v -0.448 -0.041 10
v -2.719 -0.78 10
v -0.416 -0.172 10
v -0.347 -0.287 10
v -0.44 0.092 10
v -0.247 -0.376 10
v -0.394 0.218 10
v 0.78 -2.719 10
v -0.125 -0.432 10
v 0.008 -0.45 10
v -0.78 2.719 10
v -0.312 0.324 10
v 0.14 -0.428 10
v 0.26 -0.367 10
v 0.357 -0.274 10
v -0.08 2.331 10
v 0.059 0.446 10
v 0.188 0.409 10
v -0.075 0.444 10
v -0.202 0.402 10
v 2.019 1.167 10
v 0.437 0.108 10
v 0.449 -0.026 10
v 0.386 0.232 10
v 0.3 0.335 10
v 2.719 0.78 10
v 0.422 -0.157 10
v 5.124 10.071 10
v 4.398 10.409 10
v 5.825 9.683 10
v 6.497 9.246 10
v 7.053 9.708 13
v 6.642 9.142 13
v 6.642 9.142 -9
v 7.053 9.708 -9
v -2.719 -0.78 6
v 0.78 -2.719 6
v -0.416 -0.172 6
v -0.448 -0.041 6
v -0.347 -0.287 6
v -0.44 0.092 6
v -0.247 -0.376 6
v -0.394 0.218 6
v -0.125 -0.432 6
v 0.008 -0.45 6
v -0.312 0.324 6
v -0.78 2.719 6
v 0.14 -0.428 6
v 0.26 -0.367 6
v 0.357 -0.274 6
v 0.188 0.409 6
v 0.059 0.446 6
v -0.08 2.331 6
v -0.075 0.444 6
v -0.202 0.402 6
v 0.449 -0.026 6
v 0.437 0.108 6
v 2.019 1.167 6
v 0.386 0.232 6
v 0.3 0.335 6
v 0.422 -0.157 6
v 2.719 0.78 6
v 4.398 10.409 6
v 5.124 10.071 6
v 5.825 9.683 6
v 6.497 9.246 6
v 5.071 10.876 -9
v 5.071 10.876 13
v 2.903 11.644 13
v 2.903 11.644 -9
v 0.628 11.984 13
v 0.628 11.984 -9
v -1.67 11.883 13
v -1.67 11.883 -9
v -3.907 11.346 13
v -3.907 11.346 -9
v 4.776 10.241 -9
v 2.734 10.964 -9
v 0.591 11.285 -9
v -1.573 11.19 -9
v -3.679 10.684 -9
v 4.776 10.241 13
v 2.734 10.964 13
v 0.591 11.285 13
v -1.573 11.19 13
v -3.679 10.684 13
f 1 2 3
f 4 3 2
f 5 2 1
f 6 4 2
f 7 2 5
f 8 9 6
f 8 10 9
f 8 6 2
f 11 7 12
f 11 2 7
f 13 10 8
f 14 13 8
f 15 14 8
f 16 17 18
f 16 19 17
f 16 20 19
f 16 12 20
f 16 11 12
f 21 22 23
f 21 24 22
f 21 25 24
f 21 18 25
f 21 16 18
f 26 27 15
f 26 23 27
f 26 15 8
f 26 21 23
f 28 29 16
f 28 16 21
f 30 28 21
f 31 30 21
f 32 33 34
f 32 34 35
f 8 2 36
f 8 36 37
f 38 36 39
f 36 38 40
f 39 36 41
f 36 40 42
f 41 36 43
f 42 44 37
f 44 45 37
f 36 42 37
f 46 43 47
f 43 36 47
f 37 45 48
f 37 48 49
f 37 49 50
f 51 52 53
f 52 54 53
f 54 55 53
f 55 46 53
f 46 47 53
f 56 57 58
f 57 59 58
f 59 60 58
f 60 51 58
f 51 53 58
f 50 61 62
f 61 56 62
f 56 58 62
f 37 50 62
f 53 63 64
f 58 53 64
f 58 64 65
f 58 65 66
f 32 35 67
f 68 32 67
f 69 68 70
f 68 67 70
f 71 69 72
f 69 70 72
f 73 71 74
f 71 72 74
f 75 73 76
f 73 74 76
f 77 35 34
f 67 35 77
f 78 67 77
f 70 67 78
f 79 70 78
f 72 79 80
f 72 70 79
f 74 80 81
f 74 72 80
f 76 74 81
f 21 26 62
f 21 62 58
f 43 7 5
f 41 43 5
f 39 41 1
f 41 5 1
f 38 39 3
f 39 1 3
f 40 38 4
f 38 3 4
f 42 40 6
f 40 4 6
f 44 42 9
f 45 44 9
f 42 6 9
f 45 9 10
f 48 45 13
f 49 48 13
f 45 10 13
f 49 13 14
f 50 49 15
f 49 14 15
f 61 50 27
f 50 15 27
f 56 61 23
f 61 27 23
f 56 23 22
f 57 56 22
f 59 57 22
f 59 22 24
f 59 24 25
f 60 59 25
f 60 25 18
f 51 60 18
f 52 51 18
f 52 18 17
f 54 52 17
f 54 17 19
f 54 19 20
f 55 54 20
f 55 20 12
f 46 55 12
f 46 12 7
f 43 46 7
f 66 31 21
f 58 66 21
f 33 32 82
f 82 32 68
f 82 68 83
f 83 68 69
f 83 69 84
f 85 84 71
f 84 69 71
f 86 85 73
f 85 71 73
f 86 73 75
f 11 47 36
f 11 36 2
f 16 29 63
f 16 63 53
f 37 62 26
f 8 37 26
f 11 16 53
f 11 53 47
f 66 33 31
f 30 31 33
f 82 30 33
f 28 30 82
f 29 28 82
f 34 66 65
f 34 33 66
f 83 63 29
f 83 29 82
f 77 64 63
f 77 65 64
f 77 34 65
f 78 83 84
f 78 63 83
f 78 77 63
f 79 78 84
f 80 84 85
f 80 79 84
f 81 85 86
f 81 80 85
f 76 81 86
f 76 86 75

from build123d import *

# Parameters (mm, degrees)
PAD168_DEPTH              = 22
SKETCH247_W               = 4
SKETCH247_H               = 4
PAD167_DEPTH              = 13.5
SKETCH244_R               = 0.45
SKETCH244_W               = 0.8
SKETCH244_H               = 9.5
POCKET031_DEPTH           = 5
BODY041_PLACEMENT_ANGLE   = 90
FUSION004_PLACEMENT_ANGLE = 29


with BuildPart() as segment_wing004:
    # Sketch240 → Pad168 (new body)
    with BuildSketch(Plane.XY):
        with BuildLine():
            ThreePointArc((1.377124, 11.215772), (-3.957343, 10.584396), (-8.397537, 7.561176))
            Line((-8.397537, 7.561176), (-8.917738, 8.029567))
            ThreePointArc((1.462432, 11.910554), (-4.202489, 11.240066), (-8.917738, 8.029567))
            Line((1.377124, 11.215772), (1.462432, 11.910554))
        make_face()
    extrude(amount=PAD168_DEPTH)


with BuildPart() as segment_wing004_1:
    # Body044 placement: moved
    add(segment_wing004.part.moved(Location((0, 0, -9))))


with BuildPart() as segment_on004:
    # Sketch247 → Pad167 (new body)
    with BuildSketch(Plane.XY):
        with Locations((0, 6)):
            Rectangle(SKETCH247_W, SKETCH247_H)
    extrude(amount=PAD167_DEPTH)

    # Sketch244 (on Face1 of Pad167) → Pocket031 (cut)
    with BuildSketch(Plane(origin=(0, 8, 0), x_dir=(-1, 0, 0), z_dir=(0, 1, 0))):
        with Locations((0, 11.5)):
            Circle(SKETCH244_R)
        with Locations((-1.6, 4.75)):
            Rectangle(SKETCH244_W, SKETCH244_H)
        with Locations((1.6, 4.75)):
            Rectangle(SKETCH244_W, SKETCH244_H)
    extrude(amount=-POCKET031_DEPTH, mode=Mode.SUBTRACT)


with BuildPart() as segment_on004_1:
    # Body041 placement: moved
    add(segment_on004.part.moved(Location((0, 11.5, 2))).rotate(Axis((0, 11.5, 2), (1, 0, 0)), BODY041_PLACEMENT_ANGLE))

    # Fusion004: union Segment_Wing004
    add(segment_wing004_1.part)


with BuildPart() as segment_on004_2:
    # Fusion004 placement: moved
    add(segment_on004_1.part.rotate(Axis((0, 0, 0), (0, 0, -1)), FUSION004_PLACEMENT_ANGLE))


solid = segment_on004_2.part
